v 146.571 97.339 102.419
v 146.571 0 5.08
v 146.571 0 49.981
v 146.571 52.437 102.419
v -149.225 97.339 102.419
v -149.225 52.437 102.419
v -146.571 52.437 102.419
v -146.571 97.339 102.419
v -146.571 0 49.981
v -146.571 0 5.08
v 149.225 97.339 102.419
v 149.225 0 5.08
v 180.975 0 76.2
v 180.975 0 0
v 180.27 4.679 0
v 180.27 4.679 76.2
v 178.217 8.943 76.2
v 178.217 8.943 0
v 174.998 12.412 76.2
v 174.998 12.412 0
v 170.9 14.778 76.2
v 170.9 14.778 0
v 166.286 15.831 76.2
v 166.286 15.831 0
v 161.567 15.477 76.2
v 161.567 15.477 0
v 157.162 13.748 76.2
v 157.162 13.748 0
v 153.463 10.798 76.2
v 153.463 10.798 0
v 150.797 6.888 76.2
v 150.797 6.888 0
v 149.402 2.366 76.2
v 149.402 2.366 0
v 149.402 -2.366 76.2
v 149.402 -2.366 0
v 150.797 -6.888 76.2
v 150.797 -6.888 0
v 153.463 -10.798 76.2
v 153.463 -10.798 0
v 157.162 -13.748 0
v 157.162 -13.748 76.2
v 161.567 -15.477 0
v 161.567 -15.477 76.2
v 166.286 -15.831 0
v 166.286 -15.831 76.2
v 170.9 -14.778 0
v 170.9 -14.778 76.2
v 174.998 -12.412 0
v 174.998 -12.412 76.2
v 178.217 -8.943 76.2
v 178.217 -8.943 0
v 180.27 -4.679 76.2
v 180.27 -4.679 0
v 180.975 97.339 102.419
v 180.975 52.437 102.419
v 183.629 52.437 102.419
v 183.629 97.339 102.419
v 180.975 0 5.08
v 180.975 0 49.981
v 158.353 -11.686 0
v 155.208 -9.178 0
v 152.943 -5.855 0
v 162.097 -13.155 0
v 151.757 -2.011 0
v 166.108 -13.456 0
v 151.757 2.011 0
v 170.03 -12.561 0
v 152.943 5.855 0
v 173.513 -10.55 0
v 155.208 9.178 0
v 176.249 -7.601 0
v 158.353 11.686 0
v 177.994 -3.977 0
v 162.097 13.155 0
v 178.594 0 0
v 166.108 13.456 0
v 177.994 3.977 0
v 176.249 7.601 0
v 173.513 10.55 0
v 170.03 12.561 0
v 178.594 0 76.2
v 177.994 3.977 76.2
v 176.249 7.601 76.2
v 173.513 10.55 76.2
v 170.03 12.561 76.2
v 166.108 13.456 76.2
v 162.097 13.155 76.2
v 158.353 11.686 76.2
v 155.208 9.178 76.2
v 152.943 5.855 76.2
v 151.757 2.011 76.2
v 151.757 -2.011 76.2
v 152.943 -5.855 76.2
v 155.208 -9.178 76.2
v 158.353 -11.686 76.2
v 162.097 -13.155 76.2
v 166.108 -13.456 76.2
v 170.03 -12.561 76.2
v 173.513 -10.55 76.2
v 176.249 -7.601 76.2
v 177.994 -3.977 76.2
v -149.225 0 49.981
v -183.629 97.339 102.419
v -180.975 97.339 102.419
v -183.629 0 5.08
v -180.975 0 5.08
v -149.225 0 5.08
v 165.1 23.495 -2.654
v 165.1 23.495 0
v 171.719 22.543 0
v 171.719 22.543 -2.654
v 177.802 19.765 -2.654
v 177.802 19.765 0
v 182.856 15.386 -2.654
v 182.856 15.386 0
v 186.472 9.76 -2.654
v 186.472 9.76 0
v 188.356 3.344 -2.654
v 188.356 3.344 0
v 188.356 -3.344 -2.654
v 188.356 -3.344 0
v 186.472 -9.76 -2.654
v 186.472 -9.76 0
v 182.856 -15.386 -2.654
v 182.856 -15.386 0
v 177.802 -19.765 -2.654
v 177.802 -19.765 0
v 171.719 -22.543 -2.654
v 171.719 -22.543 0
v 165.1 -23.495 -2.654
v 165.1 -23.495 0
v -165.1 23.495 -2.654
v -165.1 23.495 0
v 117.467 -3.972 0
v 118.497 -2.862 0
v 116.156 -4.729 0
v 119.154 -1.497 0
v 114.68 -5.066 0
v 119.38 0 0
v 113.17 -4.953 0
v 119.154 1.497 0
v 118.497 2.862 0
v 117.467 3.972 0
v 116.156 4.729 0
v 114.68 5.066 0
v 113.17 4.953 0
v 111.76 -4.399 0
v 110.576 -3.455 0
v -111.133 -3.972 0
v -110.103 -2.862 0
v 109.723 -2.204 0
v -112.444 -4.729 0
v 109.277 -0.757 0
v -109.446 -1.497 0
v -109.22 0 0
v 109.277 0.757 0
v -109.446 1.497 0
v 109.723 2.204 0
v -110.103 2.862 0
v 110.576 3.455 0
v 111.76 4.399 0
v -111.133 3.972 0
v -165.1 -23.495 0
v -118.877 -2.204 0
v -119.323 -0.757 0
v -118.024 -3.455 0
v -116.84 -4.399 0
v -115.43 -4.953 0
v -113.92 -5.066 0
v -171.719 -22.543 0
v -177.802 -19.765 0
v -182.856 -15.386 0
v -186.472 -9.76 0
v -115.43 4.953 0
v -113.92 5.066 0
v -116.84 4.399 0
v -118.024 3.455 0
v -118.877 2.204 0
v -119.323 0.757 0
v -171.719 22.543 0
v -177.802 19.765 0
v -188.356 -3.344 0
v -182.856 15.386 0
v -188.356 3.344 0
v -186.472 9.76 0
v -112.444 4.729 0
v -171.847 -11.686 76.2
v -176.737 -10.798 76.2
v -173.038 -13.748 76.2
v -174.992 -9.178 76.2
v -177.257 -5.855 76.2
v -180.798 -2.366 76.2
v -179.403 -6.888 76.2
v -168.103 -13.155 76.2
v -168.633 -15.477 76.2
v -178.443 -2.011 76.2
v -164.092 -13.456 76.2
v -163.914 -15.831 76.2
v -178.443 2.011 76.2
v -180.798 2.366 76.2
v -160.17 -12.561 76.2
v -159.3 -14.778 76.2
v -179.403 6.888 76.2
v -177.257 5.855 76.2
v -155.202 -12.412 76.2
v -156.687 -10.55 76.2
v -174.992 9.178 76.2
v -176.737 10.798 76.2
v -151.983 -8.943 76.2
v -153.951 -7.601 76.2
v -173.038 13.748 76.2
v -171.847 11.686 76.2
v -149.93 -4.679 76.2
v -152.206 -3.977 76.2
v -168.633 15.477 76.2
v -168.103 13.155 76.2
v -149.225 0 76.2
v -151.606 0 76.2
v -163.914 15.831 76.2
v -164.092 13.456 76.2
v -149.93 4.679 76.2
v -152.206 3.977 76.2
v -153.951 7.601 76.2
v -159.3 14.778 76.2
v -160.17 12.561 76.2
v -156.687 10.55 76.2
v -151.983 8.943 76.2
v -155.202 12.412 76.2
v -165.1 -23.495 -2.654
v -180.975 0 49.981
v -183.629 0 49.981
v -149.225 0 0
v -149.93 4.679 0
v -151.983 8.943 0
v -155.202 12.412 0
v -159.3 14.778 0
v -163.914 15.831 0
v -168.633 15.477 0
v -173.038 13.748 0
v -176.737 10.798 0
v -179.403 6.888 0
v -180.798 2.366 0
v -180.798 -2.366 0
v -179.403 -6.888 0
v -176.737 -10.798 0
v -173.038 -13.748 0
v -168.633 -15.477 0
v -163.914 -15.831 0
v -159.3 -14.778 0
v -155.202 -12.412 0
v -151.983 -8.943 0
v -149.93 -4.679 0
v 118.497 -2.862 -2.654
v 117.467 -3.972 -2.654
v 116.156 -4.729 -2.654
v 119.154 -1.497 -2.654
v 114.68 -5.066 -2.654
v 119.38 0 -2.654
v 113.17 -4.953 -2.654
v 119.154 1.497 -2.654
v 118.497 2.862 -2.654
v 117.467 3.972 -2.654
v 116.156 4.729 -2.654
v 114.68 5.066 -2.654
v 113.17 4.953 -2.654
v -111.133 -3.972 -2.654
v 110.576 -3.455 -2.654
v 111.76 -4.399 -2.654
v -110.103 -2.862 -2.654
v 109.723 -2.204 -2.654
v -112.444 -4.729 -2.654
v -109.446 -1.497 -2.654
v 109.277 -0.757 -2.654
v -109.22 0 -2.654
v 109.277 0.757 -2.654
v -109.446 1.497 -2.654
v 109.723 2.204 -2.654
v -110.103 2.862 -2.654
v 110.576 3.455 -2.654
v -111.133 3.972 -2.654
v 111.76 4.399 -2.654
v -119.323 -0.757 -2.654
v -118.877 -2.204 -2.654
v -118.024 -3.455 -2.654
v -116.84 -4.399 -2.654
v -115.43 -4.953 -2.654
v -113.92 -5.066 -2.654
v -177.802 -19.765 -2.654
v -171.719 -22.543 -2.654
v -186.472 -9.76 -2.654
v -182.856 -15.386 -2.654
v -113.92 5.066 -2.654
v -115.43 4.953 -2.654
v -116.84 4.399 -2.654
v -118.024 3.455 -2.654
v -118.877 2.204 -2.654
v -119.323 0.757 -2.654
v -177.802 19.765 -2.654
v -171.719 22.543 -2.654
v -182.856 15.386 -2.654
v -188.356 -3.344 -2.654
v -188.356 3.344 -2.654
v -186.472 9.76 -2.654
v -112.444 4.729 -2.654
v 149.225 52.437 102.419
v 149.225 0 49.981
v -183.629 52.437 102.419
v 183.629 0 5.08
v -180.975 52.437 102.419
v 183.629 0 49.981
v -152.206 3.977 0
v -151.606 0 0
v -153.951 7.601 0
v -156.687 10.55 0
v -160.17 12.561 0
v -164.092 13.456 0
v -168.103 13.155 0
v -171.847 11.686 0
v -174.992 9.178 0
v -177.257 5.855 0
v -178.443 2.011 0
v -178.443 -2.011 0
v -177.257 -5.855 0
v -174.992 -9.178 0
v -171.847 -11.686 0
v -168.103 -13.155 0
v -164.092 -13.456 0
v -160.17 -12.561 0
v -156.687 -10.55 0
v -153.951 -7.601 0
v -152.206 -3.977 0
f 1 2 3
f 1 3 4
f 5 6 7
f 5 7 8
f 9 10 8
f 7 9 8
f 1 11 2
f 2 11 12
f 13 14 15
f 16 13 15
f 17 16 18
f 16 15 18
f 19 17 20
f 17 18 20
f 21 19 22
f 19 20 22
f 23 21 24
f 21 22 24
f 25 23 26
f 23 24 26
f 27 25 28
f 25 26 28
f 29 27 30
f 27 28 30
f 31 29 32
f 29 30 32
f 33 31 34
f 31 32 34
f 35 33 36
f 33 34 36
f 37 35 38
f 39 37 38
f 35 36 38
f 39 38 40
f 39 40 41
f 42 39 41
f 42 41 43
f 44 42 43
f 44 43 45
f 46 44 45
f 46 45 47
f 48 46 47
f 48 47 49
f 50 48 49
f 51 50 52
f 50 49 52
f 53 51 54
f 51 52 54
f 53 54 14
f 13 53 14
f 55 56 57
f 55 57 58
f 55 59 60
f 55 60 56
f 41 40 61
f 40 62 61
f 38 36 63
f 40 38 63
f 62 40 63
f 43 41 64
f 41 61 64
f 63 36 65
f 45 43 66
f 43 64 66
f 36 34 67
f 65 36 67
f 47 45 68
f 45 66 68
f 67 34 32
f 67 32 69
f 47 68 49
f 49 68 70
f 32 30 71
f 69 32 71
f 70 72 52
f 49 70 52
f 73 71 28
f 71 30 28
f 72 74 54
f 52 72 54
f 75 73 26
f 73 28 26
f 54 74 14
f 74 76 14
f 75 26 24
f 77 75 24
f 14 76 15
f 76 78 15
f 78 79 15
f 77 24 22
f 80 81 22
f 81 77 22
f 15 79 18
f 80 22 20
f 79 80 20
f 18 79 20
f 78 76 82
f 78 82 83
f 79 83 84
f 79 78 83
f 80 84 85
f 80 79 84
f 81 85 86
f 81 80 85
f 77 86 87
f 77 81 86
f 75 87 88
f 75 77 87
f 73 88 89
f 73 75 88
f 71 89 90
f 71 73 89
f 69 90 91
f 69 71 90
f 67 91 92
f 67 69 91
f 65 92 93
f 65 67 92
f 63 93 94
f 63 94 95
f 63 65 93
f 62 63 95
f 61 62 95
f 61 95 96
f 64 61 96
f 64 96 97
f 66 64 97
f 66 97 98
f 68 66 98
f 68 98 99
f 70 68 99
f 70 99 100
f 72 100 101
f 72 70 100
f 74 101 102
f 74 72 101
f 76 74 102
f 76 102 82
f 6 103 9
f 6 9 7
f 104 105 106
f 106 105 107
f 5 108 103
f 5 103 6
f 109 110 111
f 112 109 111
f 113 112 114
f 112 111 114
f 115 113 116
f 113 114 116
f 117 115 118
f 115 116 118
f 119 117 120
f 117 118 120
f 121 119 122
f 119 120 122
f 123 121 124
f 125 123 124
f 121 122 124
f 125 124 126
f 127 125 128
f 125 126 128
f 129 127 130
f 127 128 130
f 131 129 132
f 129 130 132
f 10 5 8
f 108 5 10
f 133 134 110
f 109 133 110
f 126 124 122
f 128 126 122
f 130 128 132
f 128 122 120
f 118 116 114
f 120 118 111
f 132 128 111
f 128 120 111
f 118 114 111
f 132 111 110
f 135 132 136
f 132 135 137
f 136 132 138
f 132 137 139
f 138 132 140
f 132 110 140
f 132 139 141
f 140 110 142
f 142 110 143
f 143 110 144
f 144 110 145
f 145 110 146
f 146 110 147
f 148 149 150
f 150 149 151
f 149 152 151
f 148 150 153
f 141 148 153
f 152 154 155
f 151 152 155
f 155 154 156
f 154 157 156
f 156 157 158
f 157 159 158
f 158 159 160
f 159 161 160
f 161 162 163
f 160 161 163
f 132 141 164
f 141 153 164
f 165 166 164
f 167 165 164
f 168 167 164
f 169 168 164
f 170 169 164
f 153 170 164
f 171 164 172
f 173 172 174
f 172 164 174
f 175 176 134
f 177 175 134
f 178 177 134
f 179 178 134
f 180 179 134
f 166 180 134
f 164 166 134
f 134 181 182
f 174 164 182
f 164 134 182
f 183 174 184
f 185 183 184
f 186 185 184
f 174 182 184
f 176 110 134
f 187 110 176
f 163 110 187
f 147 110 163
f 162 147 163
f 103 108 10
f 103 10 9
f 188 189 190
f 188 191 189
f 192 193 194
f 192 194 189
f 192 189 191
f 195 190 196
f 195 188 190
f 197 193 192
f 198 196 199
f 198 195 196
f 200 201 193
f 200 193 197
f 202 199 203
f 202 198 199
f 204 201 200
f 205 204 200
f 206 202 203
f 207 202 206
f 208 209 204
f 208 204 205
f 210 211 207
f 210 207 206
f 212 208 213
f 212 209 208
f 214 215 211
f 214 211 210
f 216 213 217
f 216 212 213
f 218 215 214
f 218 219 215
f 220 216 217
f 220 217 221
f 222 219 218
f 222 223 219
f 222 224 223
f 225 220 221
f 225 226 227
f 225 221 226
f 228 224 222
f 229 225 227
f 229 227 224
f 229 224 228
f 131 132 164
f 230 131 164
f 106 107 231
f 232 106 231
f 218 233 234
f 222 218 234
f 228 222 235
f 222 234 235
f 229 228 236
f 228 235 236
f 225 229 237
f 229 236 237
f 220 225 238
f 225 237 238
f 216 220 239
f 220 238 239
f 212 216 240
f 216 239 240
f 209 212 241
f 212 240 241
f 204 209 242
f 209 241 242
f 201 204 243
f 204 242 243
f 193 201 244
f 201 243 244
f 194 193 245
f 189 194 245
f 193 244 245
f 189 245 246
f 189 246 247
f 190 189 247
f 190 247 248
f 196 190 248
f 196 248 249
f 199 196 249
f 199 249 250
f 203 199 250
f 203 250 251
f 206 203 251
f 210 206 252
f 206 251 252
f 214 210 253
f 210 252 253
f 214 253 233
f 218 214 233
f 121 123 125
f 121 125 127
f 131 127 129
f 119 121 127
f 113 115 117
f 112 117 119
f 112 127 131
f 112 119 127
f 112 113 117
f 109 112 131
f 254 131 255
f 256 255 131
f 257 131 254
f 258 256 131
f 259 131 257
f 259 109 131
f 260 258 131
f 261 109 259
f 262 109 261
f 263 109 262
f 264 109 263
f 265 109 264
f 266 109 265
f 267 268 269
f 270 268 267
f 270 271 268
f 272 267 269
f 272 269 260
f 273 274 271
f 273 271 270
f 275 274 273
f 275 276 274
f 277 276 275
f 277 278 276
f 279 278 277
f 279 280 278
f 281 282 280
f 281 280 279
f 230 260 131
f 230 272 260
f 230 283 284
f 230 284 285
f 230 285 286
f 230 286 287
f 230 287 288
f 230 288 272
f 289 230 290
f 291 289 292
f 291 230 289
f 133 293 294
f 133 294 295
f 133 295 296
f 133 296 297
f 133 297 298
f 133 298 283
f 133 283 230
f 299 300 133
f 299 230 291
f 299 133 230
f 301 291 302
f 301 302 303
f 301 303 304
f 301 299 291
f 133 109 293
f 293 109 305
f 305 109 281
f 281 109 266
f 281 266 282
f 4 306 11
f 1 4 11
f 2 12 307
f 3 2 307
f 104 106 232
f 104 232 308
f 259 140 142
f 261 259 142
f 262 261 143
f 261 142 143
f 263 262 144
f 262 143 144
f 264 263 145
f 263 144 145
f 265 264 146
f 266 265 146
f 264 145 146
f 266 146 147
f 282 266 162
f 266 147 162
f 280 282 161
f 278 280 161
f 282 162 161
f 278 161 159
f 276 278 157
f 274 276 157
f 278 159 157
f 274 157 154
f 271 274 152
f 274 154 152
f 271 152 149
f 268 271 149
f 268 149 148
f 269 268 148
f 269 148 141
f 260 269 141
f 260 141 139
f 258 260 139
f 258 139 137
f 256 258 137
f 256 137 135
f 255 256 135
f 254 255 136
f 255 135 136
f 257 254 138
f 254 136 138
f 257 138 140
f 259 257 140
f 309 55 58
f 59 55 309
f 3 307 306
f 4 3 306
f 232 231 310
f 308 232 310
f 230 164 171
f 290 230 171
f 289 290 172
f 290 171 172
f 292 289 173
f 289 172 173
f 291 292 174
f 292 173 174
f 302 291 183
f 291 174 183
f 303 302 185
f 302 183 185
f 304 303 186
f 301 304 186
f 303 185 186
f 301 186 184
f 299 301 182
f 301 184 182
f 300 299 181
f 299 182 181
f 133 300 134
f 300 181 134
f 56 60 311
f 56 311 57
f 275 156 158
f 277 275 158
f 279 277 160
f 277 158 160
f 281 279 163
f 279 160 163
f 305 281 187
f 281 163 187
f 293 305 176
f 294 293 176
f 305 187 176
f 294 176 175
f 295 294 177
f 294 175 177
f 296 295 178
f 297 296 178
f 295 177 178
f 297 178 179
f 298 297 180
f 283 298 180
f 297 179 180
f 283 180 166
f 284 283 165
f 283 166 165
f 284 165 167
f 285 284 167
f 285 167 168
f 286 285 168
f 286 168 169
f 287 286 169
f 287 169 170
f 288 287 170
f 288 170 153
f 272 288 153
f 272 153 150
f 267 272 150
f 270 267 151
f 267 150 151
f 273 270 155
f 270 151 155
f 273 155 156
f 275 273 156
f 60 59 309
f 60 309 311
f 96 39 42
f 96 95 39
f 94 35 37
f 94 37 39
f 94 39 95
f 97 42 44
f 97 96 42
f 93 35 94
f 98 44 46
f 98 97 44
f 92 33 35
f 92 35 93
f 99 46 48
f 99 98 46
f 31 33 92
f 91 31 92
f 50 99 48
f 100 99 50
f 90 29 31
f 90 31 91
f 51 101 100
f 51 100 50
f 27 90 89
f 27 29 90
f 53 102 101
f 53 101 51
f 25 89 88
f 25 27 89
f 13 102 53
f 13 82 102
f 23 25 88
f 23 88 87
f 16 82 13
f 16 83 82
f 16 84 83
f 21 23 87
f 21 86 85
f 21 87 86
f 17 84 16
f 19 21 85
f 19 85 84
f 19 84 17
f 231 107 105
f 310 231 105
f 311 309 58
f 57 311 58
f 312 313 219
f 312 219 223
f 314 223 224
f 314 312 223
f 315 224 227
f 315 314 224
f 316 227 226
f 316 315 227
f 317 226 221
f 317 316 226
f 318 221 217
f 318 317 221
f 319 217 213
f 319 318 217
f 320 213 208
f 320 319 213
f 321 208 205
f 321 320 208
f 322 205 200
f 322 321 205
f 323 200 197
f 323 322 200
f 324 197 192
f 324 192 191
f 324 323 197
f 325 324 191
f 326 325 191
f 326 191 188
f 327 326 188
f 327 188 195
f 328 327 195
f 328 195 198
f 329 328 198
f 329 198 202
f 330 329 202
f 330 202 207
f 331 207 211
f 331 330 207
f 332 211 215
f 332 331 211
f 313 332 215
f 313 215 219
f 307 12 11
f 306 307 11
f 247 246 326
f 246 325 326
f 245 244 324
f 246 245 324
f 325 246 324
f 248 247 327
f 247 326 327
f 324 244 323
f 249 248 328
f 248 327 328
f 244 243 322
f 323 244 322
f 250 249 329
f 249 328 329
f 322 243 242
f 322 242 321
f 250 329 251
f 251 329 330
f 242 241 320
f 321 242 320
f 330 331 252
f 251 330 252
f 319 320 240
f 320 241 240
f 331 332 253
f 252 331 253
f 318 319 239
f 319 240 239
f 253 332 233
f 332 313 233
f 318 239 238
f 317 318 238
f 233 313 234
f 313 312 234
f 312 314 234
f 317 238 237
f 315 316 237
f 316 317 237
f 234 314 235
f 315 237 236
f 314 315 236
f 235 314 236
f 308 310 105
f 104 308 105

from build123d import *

# Parameters (mm, degrees)
SKETCH1_R           = 15.875
SKETCH1_R_2         = 13.49375
PIPE_BASE_DEPTH     = 76.2
PIPE_BASE_2_DEPTH   = 76.2
SKETCH1_3_R         = 15.875
SKETCH1_3_R_2       = 13.49375
SKETCH1_3_R_3       = 5.08
BASE_PLATE_DEPTH    = 2.6543
SKETCH1_4_R         = 5.08
CASTER_HOLES_DEPTH  = 2.6543
PLATE_SUPPORT_DEPTH = 2.6543


with BuildPart() as part:
    # Sketch1 → Pipe Base (new body)
    with BuildSketch(Plane.XY):
        with Locations((-165.1, 0)):
            Circle(SKETCH1_R)
        with Locations((-165.1, 0)):
            Circle(SKETCH1_R_2, mode=Mode.SUBTRACT)
    extrude(amount=PIPE_BASE_DEPTH)


with BuildPart() as body_2:
    # Sketch1 → Pipe Base 2 (new body)
    with BuildSketch(Plane.XY):
        with Locations((165.1, 0)):
            Circle(SKETCH1_R)
        with Locations((165.1, 0)):
            Circle(SKETCH1_R_2, mode=Mode.SUBTRACT)
    extrude(amount=PIPE_BASE_2_DEPTH)


with BuildPart() as body_3:
    # Sketch1_3 → Base Plate (new body)
    with BuildSketch(Plane.XY):
        with BuildLine():
            ThreePointArc((165.1, 23.495), (188.595, 0), (165.1, -23.495))
            Line((165.1, -23.495), (-165.1, -23.495))
            ThreePointArc((-165.1, -23.495), (-188.595, 0), (-165.1, 23.495))
            Line((-165.1, 23.495), (165.1, 23.495))
        make_face()
        with Locations((-165.1, 0)):
            Circle(SKETCH1_3_R, mode=Mode.SUBTRACT)
        with Locations((165.1, 0)):
            Circle(SKETCH1_3_R, mode=Mode.SUBTRACT)
        with Locations((-165.1, 0)):
            Circle(SKETCH1_3_R)
        with Locations((-165.1, 0)):
            Circle(SKETCH1_3_R_2, mode=Mode.SUBTRACT)
        with Locations((-165.1, 0)):
            Circle(SKETCH1_3_R_2)
        with Locations((165.1, 0)):
            Circle(SKETCH1_3_R)
        with Locations((165.1, 0)):
            Circle(SKETCH1_3_R_2, mode=Mode.SUBTRACT)
        with Locations((165.1, 0)):
            Circle(SKETCH1_3_R_2)
        with Locations((-114.3, 0)):
            Circle(SKETCH1_3_R_3)
        with Locations((114.3, 0)):
            Circle(SKETCH1_3_R_3)
    extrude(amount=-BASE_PLATE_DEPTH)

    # Sketch1_4 → Caster Holes (cut)
    with BuildSketch(Plane.XY):
        with Locations((114.3, 0)):
            Circle(SKETCH1_4_R)
        with Locations((-114.3, 0)):
            Circle(SKETCH1_4_R)
    extrude(amount=-CASTER_HOLES_DEPTH, mode=Mode.SUBTRACT)


with BuildPart() as body_4:
    # Sketch2 → Plate Support (new body)
    with BuildSketch(Plane.ZY.offset(180.975)):
        Polygon((5.08, 0), (49.981280605, 0), (102.418719395, 52.437438789), (102.418719395, 97.338719395), align=None)
    extrude(amount=PLATE_SUPPORT_DEPTH)


with BuildPart() as body_5:
    # Plate Support Left Mirror: mirrored copy
    add(body_4.part.mirror(Plane.ZY.offset(165.1)))


with BuildPart() as body_6:
    # Plate Support Mirror: mirrored copy
    add(body_5.part.mirror(Plane(origin=(0, 0, 0), x_dir=(0, 0, 1), z_dir=(1, 0, 0))))


with BuildPart() as body_7:
    # Plate Support Mirror 2: mirrored copy
    add(body_4.part.mirror(Plane(origin=(0, 0, 0), x_dir=(0, 0, 1), z_dir=(1, 0, 0))))


solid = Compound([part.part, body_2.part, body_3.part, body_4.part, body_5.part, body_6.part, body_7.part])
